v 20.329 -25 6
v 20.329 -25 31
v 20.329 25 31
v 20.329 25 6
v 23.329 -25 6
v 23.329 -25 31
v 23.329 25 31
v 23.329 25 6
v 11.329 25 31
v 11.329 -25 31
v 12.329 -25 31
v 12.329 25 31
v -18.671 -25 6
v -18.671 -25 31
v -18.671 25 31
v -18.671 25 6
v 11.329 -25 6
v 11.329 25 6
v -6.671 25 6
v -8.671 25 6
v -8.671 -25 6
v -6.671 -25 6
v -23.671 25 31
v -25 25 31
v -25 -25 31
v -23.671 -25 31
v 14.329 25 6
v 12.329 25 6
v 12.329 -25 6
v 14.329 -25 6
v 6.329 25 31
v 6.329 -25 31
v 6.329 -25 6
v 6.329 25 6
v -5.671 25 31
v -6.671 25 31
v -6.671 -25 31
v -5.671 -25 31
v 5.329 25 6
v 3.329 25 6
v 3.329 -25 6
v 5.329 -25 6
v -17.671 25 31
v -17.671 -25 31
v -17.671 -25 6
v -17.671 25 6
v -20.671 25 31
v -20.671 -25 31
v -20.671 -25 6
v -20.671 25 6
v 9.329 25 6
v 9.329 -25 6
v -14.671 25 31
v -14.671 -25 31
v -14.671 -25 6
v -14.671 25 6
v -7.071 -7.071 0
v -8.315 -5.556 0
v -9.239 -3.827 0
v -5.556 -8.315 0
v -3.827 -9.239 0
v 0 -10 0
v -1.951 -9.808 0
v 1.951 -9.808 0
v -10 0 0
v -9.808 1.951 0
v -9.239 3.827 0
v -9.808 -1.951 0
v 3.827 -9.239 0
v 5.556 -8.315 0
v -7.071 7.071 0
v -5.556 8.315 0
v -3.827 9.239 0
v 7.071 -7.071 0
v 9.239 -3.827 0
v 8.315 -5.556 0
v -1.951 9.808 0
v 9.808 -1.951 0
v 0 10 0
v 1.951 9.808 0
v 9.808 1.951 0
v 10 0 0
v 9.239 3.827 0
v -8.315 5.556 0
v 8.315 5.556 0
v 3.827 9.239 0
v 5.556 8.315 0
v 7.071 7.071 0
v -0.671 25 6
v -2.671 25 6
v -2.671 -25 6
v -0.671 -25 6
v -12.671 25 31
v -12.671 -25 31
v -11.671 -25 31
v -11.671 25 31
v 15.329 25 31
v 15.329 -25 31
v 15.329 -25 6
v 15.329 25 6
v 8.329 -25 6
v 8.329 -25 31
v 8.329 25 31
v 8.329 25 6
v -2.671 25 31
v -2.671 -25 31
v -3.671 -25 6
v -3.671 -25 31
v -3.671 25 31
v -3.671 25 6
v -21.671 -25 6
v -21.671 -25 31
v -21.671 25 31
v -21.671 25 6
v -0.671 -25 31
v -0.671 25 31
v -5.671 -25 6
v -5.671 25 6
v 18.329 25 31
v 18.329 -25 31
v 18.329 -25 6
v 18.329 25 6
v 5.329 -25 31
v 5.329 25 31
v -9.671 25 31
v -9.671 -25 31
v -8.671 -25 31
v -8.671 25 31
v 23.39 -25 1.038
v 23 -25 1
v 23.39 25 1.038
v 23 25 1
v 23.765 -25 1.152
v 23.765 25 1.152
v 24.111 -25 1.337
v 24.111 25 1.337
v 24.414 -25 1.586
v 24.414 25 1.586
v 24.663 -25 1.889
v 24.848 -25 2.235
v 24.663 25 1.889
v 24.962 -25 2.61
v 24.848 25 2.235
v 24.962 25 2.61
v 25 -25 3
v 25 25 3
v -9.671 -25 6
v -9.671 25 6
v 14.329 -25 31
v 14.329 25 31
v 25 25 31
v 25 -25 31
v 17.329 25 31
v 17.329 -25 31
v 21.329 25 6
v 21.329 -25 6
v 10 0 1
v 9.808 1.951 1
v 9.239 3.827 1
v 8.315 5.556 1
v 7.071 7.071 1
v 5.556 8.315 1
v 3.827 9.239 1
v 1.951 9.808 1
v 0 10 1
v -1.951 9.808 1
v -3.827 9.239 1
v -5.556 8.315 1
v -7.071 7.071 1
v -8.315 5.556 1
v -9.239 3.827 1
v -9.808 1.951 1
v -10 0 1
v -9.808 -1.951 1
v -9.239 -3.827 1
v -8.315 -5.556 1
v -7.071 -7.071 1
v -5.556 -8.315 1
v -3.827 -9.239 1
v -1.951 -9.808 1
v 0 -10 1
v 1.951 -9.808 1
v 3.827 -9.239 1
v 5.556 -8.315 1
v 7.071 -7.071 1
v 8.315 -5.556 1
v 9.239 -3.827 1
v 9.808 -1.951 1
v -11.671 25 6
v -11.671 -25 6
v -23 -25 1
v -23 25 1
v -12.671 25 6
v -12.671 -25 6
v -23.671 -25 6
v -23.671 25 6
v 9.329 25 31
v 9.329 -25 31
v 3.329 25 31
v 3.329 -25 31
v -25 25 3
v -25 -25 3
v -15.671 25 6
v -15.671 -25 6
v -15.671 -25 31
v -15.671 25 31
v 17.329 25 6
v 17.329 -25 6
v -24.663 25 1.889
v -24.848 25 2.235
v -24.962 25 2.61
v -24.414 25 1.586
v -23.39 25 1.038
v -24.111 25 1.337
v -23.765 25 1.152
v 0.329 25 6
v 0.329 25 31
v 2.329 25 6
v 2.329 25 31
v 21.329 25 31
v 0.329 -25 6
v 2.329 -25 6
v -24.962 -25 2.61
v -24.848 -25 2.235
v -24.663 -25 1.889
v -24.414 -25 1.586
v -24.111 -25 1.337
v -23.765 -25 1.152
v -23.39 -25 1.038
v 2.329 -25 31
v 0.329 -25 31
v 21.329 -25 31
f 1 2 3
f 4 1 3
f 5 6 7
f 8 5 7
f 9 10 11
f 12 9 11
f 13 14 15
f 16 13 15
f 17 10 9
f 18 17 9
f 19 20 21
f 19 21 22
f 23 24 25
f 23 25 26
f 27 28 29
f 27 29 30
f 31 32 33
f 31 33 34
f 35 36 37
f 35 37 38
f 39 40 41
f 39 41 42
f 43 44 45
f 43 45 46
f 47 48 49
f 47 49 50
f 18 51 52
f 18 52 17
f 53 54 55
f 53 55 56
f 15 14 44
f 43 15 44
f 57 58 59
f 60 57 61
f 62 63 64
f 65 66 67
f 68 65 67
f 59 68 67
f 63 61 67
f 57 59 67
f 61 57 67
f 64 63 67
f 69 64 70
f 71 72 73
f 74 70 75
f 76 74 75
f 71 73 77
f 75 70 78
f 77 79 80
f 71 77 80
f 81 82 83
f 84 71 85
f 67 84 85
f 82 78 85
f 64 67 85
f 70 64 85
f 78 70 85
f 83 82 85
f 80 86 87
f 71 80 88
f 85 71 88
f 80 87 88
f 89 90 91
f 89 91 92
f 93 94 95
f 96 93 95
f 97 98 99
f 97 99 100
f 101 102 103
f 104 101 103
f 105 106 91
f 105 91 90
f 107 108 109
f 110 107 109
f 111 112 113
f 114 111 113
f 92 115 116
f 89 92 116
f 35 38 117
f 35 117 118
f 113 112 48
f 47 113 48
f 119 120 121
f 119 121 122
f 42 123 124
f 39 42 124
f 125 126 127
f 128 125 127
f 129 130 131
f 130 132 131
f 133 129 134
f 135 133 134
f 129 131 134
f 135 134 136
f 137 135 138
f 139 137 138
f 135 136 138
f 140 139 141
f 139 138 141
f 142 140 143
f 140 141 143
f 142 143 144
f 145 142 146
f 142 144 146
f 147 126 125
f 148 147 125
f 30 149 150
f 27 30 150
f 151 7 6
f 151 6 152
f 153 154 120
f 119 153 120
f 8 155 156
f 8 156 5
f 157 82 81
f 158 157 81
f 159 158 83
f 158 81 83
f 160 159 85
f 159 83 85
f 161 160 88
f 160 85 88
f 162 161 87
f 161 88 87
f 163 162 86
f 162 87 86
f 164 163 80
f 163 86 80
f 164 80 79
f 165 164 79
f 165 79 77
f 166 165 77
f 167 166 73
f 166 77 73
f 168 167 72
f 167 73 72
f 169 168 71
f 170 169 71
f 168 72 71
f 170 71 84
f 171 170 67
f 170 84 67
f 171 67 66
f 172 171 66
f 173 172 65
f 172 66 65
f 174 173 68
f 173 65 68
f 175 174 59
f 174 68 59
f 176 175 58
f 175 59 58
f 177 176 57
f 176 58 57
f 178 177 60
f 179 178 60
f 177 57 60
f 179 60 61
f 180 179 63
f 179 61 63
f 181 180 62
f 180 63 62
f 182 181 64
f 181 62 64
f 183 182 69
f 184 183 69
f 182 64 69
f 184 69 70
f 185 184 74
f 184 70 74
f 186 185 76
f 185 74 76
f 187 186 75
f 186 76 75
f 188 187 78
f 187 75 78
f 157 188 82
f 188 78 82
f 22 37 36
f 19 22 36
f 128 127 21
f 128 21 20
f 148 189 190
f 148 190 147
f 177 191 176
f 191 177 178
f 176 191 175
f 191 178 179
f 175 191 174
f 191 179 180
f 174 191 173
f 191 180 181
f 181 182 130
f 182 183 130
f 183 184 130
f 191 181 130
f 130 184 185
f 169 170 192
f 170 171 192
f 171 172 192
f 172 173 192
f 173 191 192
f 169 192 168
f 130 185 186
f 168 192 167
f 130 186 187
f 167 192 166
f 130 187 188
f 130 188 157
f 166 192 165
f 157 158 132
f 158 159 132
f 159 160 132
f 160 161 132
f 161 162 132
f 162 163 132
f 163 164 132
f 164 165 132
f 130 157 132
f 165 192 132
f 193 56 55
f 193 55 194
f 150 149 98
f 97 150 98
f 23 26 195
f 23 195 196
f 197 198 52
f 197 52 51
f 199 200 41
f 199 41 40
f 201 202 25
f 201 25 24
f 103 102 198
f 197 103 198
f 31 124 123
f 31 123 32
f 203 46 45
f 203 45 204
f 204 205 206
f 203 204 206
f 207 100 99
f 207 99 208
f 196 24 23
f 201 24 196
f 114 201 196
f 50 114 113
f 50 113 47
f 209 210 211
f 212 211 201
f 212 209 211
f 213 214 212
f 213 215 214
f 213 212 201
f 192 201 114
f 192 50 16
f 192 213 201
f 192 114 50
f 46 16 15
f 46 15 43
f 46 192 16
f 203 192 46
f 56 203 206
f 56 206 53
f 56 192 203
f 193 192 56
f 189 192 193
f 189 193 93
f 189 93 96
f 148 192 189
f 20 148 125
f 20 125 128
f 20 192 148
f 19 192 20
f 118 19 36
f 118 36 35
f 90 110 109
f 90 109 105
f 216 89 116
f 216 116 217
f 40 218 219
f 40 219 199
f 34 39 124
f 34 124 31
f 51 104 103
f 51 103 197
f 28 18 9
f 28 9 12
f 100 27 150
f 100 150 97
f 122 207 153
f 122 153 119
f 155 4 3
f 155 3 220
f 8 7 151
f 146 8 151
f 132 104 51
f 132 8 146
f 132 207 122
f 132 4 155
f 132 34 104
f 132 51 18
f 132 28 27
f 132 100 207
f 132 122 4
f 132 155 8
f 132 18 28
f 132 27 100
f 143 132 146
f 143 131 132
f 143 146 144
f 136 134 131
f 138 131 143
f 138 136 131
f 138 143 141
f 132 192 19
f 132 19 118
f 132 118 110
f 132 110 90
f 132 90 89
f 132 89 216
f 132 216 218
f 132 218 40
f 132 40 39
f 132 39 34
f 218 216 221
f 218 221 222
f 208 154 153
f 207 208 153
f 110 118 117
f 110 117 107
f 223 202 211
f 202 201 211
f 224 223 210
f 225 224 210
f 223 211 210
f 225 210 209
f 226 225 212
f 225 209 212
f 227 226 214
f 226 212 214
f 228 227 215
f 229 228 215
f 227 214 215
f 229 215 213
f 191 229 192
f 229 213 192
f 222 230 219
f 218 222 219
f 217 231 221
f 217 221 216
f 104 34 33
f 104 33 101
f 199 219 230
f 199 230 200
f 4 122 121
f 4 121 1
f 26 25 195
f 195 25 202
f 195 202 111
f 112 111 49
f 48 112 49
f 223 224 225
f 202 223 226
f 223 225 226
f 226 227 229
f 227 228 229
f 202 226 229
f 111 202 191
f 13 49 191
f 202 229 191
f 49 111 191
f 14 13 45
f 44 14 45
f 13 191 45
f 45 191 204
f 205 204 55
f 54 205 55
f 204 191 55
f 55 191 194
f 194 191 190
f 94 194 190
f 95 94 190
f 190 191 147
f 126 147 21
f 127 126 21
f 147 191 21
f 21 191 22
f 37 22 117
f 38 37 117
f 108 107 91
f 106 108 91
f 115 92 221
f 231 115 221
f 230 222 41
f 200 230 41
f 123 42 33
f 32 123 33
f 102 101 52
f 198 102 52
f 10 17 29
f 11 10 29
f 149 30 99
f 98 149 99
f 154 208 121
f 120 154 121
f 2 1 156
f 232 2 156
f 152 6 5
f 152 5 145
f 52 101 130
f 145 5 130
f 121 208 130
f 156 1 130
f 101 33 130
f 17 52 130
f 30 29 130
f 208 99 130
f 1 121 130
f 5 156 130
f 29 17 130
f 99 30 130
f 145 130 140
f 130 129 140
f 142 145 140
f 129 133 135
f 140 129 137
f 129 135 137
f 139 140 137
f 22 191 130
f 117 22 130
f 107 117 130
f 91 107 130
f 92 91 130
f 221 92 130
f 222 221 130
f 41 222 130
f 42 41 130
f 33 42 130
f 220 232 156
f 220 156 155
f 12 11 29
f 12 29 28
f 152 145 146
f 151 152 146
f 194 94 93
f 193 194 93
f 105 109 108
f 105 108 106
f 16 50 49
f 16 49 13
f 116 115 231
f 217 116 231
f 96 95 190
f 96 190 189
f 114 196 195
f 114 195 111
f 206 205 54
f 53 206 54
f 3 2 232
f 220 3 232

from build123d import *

# Parameters (mm, degrees)
SKETCH1_R           = 10
BOSS_EXTRUDE1_DEPTH = 1
SKETCH2_W           = 50
SKETCH2_H           = 50
BOSS_EXTRUDE2_DEPTH = 30
SKETCH3_W           = 2
SKETCH3_H           = 50
CUT_EXTRUDE1_DEPTH  = 25
FILLET1_R           = 2


with BuildPart() as part:
    # Sketch1 → Boss-Extrude1 (new body)
    with BuildSketch(Plane.XY):
        Circle(SKETCH1_R)
    extrude(amount=BOSS_EXTRUDE1_DEPTH)

    # Sketch2 → Boss-Extrude2 (add)
    with BuildSketch(Plane.XY.offset(1)):
        Rectangle(SKETCH2_W, SKETCH2_H)
    extrude(amount=BOSS_EXTRUDE2_DEPTH)

    # Sketch3 → Cut-Extrude1 (cut)
    with BuildSketch(Plane.XY.offset(31)):
        with Locations((-22.6705156, 0)):
            Rectangle(SKETCH3_W, SKETCH3_H)
        with Locations((-19.6705156, 0)):
            Rectangle(SKETCH3_W, SKETCH3_H)
        with Locations((-16.6705156, 0)):
            Rectangle(SKETCH3_W, SKETCH3_H)
        with Locations((-13.6705156, 0)):
            Rectangle(SKETCH3_W, SKETCH3_H)
        with Locations((-10.6705156, 0)):
            Rectangle(SKETCH3_W, SKETCH3_H)
        with Locations((-7.6705156, 0)):
            Rectangle(SKETCH3_W, SKETCH3_H)
        with Locations((-4.6705156, 0)):
            Rectangle(SKETCH3_W, SKETCH3_H)
        with Locations((-1.6705156, 0)):
            Rectangle(SKETCH3_W, SKETCH3_H)
        with Locations((1.3294844, 0)):
            Rectangle(SKETCH3_W, SKETCH3_H)
        with Locations((4.3294844, 0)):
            Rectangle(SKETCH3_W, SKETCH3_H)
        with Locations((7.3294844, 0)):
            Rectangle(SKETCH3_W, SKETCH3_H)
        with Locations((10.3294844, 0)):
            Rectangle(SKETCH3_W, SKETCH3_H)
        with Locations((13.3294844, 0)):
            Rectangle(SKETCH3_W, SKETCH3_H)
        with Locations((16.3294844, 0)):
            Rectangle(SKETCH3_W, SKETCH3_H)
        with Locations((19.3294844, 0)):
            Rectangle(SKETCH3_W, SKETCH3_H)
        with Locations((22.3294844, 0)):
            Rectangle(SKETCH3_W, SKETCH3_H)
    extrude(amount=-CUT_EXTRUDE1_DEPTH, mode=Mode.SUBTRACT)

    # Fillet1
    fillet1_edges = [part.edges().sort_by_distance(p)[0] for p in [
        (25, 0, 1),
        (-25, 0, 1),
    ]]
    fillet(fillet1_edges, radius=FILLET1_R)


solid = part.part
